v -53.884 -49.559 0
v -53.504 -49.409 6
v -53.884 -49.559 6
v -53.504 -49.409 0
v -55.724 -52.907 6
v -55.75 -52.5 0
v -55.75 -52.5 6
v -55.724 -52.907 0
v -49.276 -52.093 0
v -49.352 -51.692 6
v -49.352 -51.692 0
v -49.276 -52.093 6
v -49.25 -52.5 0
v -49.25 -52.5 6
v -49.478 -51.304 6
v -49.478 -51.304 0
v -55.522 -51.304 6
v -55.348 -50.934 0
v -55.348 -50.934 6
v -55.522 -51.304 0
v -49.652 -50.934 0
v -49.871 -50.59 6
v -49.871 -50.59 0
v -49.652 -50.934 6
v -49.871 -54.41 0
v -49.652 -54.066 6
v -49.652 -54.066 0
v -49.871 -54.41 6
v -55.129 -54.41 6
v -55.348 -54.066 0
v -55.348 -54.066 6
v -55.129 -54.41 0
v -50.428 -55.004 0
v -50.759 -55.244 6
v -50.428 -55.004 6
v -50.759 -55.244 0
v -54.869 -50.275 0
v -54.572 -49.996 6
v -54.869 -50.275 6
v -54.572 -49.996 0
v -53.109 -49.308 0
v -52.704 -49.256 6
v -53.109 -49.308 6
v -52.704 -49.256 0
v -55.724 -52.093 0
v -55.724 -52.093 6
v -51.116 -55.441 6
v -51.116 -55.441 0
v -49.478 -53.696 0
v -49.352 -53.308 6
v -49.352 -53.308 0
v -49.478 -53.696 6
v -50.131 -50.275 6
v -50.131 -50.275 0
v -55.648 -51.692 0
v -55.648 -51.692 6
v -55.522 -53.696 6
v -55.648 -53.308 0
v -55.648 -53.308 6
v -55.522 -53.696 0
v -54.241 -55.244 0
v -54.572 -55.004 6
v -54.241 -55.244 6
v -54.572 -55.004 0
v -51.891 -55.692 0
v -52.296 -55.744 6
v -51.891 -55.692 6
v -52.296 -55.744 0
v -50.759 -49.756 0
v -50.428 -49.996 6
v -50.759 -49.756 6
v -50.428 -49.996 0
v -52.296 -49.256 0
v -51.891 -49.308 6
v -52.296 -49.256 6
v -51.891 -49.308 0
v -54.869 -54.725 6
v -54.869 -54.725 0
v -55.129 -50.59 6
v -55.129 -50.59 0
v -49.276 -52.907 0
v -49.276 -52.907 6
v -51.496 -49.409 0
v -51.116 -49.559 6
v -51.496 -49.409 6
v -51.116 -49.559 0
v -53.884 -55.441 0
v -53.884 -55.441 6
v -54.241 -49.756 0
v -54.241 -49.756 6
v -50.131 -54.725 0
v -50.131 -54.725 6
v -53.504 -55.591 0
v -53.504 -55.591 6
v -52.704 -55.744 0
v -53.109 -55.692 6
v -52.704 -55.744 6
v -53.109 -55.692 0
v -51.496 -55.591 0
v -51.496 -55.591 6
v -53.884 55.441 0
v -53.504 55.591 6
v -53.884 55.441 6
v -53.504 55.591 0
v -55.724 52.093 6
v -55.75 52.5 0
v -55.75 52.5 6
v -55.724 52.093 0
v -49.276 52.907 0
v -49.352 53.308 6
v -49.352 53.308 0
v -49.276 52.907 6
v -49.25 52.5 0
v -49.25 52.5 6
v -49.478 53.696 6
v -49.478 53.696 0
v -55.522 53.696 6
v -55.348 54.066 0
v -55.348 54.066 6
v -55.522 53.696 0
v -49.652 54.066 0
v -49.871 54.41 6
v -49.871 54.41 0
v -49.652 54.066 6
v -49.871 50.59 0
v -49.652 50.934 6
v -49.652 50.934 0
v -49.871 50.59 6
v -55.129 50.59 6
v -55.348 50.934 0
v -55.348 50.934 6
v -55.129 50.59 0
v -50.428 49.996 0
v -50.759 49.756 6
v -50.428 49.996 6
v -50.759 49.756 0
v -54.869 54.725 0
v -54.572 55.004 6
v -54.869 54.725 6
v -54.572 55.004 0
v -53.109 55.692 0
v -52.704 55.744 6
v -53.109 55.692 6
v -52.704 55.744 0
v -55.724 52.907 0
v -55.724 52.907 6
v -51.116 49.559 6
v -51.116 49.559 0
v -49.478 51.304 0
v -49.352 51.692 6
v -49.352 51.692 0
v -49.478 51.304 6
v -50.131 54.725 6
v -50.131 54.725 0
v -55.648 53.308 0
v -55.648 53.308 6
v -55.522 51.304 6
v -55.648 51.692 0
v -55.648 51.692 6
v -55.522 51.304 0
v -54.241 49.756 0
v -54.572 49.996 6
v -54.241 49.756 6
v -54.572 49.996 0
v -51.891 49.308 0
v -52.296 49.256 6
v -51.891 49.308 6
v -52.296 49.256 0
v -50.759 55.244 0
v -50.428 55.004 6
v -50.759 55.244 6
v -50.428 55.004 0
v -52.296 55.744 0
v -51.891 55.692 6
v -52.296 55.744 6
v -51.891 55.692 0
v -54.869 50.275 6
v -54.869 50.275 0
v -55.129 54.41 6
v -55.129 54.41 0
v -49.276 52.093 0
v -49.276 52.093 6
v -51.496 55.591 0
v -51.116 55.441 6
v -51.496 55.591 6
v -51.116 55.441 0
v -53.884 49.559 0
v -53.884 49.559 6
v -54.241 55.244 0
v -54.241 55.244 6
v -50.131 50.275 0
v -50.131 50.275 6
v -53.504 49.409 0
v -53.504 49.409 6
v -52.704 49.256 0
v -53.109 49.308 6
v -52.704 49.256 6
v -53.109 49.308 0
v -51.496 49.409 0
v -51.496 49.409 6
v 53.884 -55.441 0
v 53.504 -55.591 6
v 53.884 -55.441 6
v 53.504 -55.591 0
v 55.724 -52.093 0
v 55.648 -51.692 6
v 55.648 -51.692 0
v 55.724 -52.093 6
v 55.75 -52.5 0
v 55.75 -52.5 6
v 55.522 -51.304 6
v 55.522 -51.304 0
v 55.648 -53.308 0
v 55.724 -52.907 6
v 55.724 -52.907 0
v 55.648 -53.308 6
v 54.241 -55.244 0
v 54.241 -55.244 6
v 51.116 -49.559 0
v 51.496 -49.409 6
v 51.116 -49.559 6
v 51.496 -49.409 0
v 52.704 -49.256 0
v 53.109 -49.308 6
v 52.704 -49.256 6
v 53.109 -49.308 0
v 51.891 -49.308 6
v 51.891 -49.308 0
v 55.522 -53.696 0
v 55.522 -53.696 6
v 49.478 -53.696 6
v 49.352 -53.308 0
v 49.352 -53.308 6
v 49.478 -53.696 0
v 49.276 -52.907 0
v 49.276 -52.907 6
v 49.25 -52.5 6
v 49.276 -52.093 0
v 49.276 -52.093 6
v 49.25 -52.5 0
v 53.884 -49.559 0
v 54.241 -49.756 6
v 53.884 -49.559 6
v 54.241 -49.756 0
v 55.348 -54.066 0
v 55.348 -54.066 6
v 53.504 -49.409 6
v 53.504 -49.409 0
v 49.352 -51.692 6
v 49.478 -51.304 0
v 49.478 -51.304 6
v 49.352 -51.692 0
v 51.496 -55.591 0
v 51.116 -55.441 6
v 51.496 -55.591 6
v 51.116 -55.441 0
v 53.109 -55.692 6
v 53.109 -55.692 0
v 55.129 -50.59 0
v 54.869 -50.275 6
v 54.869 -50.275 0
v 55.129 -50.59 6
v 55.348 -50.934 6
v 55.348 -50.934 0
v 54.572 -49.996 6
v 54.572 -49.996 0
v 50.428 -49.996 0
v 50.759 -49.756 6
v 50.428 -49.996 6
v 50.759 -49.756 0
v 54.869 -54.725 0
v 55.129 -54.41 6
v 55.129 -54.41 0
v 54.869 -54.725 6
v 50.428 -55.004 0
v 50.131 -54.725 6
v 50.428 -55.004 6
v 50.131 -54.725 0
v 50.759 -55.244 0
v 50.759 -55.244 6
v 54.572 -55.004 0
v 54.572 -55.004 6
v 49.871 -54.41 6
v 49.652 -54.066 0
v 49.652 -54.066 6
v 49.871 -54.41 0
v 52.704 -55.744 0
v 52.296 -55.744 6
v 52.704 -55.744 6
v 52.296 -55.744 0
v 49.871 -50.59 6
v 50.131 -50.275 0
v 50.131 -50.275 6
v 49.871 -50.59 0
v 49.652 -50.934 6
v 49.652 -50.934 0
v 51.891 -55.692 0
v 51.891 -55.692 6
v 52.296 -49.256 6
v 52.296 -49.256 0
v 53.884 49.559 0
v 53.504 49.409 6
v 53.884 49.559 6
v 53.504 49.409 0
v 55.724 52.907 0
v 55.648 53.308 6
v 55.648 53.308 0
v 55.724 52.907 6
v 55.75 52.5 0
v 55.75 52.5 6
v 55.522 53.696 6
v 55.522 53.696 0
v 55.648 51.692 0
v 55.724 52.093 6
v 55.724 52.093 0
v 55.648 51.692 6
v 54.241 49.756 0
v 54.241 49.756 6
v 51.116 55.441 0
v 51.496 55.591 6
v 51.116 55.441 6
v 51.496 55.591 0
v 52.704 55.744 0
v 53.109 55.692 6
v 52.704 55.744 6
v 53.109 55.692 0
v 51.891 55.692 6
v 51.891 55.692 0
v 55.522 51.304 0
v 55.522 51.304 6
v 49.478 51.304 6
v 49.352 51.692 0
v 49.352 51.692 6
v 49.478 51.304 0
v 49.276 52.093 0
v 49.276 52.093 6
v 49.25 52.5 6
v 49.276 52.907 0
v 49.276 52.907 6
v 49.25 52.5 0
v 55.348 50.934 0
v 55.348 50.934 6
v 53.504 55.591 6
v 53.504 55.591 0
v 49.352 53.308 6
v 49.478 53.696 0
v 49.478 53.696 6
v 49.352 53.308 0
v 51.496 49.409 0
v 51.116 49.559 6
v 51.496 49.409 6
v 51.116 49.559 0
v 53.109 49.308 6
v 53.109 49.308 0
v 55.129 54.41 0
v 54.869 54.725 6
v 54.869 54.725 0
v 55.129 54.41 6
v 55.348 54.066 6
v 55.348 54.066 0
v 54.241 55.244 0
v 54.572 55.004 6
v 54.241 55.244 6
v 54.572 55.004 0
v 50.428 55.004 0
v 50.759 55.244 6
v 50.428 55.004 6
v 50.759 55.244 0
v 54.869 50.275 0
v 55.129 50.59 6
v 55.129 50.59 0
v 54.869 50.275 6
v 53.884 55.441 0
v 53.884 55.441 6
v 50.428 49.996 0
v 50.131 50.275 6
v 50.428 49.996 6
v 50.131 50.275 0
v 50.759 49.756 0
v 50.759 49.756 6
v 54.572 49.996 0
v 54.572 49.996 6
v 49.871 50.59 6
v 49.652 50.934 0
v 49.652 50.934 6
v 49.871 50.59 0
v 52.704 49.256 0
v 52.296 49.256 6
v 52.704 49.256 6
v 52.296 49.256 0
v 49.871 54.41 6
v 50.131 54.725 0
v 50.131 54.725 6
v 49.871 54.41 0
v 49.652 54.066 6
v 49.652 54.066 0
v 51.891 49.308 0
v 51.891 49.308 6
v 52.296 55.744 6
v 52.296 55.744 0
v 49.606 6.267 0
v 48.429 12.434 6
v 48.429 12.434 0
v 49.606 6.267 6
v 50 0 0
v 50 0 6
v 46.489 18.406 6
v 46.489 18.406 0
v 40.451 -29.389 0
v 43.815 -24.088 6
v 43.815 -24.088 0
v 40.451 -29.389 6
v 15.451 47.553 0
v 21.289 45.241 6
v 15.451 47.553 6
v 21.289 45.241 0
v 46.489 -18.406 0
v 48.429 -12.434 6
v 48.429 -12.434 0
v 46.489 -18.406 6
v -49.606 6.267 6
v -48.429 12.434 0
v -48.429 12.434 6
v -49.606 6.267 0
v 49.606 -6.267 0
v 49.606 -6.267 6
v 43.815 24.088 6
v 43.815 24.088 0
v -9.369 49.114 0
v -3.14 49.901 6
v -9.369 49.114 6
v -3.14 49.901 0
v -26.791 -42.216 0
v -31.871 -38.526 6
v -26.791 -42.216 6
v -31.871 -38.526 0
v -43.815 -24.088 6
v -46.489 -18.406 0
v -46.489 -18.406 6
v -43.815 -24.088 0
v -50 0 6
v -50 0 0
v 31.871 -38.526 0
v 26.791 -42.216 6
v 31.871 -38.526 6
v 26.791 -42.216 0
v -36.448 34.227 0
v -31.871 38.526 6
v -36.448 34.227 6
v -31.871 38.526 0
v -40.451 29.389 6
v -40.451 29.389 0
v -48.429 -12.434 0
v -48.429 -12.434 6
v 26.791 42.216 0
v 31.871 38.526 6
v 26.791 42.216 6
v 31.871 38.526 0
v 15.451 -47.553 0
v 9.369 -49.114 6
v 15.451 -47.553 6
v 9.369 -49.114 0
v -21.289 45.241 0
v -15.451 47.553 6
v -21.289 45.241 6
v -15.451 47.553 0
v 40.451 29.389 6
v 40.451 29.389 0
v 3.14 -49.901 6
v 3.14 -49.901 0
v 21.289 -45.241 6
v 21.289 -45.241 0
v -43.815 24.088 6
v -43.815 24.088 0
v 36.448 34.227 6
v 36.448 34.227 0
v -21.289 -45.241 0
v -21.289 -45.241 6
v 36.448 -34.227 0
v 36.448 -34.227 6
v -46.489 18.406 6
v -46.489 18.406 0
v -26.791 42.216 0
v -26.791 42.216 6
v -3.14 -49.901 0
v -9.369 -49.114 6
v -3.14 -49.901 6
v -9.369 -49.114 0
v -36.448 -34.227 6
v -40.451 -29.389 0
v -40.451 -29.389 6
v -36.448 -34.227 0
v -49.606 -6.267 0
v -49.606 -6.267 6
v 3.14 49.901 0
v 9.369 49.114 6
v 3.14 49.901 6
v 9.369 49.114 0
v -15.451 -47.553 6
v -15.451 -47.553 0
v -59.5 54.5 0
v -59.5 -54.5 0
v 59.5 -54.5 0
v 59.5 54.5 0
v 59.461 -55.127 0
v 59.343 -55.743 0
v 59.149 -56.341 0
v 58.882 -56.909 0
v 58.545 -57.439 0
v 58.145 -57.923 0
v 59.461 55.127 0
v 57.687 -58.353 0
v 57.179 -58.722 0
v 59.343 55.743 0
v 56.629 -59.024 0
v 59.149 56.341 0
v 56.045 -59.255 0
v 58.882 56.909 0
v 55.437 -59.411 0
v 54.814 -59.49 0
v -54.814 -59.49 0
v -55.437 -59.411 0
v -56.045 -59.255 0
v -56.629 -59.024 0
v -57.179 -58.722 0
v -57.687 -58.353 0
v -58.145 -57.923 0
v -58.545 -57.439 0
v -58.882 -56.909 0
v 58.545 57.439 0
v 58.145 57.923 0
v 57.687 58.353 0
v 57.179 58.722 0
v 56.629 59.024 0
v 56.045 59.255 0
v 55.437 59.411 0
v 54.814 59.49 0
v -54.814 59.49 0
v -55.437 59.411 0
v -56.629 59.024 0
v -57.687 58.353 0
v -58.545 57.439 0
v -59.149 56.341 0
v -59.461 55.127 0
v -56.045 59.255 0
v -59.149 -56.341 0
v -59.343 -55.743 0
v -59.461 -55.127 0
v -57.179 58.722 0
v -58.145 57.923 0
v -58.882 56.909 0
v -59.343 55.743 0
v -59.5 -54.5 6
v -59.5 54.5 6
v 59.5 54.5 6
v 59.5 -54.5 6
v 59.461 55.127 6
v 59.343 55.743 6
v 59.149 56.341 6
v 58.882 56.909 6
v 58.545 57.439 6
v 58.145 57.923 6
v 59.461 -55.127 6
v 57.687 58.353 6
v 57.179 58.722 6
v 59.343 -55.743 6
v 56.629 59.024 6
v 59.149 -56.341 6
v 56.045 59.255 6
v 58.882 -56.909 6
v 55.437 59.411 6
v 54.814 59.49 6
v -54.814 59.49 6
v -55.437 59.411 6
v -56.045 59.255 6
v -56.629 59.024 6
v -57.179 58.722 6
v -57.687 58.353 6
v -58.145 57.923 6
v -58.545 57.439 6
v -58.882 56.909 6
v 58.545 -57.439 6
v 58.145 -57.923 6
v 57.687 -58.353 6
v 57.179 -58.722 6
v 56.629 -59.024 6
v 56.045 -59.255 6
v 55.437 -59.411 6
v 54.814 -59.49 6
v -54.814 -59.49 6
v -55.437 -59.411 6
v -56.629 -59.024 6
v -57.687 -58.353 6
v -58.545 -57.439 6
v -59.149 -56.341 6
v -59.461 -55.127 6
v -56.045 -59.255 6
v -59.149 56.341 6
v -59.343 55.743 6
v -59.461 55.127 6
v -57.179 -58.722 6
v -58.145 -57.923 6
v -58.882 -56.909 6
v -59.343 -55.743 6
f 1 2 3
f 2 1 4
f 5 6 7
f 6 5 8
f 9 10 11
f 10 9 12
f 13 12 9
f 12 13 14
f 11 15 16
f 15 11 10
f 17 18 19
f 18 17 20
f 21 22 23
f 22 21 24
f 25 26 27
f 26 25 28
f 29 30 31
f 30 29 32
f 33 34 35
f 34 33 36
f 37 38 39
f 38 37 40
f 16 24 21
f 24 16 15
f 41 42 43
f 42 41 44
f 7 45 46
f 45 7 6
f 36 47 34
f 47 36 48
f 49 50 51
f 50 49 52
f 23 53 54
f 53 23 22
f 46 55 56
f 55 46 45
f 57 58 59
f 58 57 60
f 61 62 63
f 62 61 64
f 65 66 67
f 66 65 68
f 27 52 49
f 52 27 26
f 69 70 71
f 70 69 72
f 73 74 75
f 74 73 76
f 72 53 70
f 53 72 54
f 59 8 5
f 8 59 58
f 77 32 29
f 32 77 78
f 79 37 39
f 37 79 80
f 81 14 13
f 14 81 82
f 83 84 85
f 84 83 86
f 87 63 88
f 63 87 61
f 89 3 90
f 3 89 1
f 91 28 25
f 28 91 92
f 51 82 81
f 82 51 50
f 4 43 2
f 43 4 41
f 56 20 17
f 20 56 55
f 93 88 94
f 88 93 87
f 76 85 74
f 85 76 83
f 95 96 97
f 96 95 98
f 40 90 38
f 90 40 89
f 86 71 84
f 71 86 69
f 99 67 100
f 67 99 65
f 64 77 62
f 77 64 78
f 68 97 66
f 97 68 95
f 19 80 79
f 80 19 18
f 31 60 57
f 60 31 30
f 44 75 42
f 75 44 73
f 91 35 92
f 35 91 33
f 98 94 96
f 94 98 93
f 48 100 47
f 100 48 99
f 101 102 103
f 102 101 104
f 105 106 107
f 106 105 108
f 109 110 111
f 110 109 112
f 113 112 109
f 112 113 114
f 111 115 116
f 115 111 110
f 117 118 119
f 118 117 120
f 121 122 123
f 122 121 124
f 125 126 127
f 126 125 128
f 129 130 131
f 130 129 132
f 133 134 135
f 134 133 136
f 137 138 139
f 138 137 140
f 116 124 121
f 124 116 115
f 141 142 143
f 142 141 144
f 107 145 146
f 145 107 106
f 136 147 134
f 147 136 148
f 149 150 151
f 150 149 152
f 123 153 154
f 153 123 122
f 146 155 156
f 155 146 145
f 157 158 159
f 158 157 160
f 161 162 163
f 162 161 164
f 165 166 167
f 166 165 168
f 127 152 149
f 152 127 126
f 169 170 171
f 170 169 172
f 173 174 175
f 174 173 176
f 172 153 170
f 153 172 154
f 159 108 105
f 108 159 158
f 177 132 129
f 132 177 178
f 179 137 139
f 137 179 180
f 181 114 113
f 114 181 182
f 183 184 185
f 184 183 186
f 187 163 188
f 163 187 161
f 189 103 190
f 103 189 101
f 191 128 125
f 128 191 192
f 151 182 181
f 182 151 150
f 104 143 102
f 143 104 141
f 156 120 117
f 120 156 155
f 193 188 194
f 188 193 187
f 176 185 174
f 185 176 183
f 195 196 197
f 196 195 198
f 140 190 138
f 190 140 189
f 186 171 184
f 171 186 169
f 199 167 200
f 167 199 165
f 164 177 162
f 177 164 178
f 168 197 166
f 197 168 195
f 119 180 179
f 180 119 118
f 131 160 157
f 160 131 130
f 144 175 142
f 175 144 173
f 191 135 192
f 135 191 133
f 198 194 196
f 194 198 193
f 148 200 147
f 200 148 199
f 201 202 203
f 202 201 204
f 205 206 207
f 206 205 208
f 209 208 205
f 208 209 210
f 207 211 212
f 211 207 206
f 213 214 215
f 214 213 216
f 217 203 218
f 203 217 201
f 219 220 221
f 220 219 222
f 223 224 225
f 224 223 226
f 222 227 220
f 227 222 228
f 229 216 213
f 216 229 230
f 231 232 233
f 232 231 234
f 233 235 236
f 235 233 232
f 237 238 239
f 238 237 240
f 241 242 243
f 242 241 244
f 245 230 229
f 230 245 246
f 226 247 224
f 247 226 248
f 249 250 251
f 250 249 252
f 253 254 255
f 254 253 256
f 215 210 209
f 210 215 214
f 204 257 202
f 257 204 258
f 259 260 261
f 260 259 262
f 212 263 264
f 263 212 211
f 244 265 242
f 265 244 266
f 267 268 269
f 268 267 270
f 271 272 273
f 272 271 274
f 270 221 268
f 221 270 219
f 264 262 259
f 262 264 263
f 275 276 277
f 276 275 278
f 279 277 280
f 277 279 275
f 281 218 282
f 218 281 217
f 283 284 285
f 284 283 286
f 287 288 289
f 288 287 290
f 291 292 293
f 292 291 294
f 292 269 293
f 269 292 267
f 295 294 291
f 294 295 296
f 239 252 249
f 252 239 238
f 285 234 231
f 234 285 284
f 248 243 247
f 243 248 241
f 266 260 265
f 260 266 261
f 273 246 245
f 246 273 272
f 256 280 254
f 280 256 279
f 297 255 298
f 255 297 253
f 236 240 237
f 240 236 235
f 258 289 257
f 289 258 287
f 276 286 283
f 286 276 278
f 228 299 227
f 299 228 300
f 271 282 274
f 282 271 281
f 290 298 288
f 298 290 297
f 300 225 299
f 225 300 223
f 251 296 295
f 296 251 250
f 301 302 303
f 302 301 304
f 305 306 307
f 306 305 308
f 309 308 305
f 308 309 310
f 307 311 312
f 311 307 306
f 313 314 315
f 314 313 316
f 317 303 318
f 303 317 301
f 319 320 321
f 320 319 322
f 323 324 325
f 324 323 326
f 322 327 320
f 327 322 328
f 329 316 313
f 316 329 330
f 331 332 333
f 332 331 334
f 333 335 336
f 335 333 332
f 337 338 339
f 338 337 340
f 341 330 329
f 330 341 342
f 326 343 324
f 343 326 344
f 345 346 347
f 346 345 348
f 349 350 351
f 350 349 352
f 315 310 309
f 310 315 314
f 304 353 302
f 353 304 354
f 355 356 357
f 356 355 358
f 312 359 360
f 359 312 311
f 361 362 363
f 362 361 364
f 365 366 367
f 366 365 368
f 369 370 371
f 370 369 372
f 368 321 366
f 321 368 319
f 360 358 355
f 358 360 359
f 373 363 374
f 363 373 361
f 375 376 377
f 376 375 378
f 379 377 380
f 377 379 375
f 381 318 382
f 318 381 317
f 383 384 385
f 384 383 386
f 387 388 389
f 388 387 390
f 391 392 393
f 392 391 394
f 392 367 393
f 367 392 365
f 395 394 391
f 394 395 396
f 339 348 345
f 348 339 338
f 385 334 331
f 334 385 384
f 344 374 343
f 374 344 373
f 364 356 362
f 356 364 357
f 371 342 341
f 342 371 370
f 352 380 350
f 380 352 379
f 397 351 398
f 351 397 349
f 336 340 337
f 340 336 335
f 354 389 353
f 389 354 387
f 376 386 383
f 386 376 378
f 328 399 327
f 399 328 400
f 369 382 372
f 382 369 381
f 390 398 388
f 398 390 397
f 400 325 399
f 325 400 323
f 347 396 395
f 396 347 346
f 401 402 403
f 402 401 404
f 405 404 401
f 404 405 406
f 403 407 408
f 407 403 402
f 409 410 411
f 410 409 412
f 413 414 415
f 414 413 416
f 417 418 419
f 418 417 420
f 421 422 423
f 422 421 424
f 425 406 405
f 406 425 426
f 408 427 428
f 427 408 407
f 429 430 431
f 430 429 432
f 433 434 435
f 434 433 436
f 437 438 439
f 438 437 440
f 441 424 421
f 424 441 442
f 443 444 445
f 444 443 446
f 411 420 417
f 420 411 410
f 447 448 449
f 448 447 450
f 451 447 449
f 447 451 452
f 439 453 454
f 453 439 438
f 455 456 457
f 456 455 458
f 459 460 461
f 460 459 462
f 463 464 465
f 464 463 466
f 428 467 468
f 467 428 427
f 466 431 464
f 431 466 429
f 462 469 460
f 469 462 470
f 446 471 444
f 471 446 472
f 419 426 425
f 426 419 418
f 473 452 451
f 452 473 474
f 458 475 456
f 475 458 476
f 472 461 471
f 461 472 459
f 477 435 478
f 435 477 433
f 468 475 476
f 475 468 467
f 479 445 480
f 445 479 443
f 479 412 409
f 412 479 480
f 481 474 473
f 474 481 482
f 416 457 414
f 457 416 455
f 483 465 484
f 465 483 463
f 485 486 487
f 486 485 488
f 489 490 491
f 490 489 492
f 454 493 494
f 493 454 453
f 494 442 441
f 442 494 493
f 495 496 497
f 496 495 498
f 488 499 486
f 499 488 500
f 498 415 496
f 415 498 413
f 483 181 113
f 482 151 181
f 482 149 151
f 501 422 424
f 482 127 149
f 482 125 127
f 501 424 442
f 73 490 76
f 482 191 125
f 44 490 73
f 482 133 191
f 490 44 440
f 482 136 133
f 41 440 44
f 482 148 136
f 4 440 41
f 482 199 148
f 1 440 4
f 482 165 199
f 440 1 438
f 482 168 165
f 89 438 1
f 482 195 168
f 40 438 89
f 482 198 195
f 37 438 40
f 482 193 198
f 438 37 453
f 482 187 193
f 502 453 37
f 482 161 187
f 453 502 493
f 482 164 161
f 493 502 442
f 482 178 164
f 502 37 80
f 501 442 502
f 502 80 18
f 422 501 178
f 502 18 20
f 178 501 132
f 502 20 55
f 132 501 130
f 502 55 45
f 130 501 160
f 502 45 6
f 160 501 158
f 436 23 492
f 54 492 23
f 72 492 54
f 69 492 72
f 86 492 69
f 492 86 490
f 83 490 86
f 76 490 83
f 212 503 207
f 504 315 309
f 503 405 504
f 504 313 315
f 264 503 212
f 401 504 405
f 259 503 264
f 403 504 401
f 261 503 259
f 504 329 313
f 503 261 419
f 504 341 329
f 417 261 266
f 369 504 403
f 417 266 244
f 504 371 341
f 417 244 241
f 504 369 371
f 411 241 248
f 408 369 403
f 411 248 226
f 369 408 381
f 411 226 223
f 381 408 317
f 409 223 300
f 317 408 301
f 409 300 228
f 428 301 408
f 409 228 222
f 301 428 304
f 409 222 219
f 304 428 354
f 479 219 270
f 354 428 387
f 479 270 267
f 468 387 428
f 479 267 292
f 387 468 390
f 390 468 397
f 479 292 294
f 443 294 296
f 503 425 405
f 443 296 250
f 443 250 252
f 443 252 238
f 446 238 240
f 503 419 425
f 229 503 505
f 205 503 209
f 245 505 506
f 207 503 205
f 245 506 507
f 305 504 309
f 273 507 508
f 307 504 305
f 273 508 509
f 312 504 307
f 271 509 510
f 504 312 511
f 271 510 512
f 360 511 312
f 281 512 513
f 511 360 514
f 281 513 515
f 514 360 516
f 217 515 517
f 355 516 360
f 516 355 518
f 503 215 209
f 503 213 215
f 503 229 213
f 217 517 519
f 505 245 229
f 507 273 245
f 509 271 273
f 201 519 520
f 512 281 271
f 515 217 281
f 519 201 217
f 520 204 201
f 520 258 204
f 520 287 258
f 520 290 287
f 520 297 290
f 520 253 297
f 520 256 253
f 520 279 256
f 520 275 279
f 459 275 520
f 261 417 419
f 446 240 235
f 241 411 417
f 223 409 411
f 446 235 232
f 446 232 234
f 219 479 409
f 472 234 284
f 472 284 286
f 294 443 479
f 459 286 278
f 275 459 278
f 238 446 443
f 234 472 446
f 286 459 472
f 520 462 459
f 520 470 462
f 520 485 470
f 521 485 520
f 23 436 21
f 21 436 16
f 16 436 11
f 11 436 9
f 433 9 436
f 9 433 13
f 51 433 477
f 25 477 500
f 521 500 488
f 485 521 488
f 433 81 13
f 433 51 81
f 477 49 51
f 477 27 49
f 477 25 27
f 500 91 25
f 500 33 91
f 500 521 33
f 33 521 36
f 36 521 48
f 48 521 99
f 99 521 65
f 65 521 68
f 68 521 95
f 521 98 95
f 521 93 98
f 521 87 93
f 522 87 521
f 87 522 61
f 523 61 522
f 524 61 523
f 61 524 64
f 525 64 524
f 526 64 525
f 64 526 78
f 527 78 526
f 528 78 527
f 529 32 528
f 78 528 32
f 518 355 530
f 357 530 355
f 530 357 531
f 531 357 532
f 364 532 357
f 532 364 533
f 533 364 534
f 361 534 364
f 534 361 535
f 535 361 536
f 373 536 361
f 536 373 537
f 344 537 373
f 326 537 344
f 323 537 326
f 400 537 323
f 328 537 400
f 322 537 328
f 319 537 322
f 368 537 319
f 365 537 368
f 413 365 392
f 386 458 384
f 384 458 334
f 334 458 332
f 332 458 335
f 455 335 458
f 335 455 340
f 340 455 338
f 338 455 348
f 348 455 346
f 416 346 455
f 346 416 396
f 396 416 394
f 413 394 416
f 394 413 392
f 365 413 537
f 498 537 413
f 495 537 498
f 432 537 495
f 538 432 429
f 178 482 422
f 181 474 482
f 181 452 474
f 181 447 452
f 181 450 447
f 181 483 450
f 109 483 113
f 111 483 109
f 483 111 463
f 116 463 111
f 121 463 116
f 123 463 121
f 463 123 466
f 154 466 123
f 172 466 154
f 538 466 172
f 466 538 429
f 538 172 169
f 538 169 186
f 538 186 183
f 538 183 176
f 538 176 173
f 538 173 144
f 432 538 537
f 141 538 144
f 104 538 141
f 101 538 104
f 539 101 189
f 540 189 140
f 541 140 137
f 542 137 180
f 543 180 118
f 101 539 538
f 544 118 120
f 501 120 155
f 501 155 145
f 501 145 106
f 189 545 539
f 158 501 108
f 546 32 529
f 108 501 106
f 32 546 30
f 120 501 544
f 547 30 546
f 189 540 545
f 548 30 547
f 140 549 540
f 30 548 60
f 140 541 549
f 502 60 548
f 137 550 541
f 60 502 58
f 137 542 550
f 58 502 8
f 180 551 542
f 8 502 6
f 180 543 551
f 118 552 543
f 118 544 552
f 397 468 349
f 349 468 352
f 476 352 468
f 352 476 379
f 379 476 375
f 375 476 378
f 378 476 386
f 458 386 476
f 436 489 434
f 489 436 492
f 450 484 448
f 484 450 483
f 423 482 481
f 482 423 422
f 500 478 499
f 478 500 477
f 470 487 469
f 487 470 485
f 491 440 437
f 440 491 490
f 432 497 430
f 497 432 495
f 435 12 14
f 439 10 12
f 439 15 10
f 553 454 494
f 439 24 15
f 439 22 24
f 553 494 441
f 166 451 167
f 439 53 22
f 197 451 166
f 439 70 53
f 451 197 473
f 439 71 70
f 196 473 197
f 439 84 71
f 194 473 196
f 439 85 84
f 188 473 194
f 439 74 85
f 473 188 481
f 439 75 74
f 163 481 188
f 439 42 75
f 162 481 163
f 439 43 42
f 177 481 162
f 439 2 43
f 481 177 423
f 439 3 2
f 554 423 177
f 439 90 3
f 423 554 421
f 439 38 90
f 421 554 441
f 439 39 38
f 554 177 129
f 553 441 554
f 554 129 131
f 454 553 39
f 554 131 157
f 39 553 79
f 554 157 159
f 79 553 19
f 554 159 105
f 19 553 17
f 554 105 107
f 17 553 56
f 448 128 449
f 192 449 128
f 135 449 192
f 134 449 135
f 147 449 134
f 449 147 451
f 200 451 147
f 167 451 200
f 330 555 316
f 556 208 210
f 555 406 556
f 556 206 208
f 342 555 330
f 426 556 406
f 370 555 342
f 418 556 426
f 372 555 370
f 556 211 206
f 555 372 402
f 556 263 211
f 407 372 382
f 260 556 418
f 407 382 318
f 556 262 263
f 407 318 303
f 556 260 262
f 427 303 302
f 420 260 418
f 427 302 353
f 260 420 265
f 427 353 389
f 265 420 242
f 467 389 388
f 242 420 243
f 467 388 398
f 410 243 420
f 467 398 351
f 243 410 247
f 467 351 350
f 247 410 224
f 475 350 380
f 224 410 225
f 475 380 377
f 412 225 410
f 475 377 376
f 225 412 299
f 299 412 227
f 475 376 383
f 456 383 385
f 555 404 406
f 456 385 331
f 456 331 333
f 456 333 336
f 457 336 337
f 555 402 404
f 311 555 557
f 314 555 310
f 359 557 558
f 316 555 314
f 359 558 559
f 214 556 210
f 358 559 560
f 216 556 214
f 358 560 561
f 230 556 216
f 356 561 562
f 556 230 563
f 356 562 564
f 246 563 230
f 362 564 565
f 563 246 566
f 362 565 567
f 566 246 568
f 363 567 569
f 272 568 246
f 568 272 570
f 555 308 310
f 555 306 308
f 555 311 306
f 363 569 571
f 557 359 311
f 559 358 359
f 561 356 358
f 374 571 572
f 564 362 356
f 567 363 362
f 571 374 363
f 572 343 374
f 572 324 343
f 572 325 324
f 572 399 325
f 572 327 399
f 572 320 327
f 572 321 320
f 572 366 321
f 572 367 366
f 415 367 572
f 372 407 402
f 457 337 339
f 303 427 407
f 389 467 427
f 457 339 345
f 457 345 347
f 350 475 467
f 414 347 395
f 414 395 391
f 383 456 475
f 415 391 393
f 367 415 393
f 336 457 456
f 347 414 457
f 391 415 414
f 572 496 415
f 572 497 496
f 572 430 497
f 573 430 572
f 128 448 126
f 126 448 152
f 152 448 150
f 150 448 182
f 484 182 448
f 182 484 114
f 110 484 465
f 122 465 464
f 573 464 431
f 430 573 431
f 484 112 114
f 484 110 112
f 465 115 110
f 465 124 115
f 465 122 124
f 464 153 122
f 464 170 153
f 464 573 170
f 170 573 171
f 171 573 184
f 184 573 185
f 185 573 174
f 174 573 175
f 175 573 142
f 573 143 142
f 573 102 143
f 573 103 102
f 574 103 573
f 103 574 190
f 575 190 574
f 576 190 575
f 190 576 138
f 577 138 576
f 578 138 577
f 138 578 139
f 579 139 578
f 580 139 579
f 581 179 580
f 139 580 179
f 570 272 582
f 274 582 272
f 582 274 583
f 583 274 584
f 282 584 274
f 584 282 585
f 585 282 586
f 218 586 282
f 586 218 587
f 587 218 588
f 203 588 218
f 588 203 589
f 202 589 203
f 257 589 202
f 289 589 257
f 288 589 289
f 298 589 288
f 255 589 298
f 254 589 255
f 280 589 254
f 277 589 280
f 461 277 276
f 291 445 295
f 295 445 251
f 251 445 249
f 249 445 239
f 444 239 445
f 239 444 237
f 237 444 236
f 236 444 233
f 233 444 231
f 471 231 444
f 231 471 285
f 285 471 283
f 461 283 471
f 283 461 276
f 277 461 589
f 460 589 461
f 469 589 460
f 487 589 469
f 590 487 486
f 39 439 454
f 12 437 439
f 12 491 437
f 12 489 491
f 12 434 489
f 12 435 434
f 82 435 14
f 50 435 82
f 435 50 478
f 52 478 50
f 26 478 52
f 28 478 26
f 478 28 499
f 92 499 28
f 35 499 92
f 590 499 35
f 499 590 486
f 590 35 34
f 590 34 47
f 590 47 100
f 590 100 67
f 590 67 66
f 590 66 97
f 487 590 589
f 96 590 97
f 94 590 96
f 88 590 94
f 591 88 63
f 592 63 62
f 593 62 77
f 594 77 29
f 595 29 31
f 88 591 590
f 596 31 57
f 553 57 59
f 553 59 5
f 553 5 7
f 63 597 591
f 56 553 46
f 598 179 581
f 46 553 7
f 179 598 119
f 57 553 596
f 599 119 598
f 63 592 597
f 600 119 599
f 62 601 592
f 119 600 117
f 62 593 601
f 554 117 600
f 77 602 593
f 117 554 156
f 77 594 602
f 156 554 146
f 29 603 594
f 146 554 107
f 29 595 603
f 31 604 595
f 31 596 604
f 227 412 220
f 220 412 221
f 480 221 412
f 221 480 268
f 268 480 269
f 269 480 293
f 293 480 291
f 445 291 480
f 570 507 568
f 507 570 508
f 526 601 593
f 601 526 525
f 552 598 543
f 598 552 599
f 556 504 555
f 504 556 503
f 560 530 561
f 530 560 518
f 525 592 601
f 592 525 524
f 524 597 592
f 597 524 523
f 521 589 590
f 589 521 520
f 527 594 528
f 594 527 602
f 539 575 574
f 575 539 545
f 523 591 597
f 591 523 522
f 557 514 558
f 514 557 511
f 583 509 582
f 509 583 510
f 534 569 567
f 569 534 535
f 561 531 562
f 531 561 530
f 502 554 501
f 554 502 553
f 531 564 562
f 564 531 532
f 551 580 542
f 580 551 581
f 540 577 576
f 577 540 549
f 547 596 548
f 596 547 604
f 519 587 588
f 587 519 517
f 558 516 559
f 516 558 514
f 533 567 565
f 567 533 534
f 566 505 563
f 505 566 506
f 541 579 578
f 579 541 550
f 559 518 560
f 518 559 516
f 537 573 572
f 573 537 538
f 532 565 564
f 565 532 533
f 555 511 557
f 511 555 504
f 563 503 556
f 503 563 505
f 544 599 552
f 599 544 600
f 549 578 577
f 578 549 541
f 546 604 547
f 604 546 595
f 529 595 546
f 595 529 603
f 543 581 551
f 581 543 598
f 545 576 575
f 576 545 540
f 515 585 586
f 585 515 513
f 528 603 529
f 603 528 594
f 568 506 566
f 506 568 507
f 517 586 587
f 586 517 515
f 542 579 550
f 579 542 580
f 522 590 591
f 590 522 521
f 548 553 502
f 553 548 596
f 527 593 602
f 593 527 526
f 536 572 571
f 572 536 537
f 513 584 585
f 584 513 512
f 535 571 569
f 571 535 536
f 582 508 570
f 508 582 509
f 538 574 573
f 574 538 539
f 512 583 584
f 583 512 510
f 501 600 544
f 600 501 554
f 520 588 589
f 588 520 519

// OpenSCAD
$fn = 50;

difference() {
	union() {
		hull() {
			translate(v = [-54.5, 54.5, 0]) {
				cylinder(h = 6, r = 5);
			}
			translate(v = [54.5, 54.5, 0]) {
				cylinder(h = 6, r = 5);
			}
			translate(v = [-54.5, -54.5, 0]) {
				cylinder(h = 6, r = 5);
			}
			translate(v = [54.5, -54.5, 0]) {
				cylinder(h = 6, r = 5);
			}
		}
	}
	union() {
		translate(v = [-52.5, -52.5, -100.0]) {
			cylinder(h = 200, r = 3.25);
		}
		translate(v = [-52.5, 52.5, -100.0]) {
			cylinder(h = 200, r = 3.25);
		}
		translate(v = [52.5, -52.5, -100.0]) {
			cylinder(h = 200, r = 3.25);
		}
		translate(v = [52.5, 52.5, -100.0]) {
			cylinder(h = 200, r = 3.25);
		}
		translate(v = [-52.5, -52.5, -100.0]) {
			cylinder(h = 200, r = 1.8);
		}
		translate(v = [-52.5, 52.5, -100.0]) {
			cylinder(h = 200, r = 1.8);
		}
		translate(v = [52.5, -52.5, -100.0]) {
			cylinder(h = 200, r = 1.8);
		}
		translate(v = [52.5, 52.5, -100.0]) {
			cylinder(h = 200, r = 1.8);
		}
		cylinder(h = 6, r = 50.0);
	}
}
